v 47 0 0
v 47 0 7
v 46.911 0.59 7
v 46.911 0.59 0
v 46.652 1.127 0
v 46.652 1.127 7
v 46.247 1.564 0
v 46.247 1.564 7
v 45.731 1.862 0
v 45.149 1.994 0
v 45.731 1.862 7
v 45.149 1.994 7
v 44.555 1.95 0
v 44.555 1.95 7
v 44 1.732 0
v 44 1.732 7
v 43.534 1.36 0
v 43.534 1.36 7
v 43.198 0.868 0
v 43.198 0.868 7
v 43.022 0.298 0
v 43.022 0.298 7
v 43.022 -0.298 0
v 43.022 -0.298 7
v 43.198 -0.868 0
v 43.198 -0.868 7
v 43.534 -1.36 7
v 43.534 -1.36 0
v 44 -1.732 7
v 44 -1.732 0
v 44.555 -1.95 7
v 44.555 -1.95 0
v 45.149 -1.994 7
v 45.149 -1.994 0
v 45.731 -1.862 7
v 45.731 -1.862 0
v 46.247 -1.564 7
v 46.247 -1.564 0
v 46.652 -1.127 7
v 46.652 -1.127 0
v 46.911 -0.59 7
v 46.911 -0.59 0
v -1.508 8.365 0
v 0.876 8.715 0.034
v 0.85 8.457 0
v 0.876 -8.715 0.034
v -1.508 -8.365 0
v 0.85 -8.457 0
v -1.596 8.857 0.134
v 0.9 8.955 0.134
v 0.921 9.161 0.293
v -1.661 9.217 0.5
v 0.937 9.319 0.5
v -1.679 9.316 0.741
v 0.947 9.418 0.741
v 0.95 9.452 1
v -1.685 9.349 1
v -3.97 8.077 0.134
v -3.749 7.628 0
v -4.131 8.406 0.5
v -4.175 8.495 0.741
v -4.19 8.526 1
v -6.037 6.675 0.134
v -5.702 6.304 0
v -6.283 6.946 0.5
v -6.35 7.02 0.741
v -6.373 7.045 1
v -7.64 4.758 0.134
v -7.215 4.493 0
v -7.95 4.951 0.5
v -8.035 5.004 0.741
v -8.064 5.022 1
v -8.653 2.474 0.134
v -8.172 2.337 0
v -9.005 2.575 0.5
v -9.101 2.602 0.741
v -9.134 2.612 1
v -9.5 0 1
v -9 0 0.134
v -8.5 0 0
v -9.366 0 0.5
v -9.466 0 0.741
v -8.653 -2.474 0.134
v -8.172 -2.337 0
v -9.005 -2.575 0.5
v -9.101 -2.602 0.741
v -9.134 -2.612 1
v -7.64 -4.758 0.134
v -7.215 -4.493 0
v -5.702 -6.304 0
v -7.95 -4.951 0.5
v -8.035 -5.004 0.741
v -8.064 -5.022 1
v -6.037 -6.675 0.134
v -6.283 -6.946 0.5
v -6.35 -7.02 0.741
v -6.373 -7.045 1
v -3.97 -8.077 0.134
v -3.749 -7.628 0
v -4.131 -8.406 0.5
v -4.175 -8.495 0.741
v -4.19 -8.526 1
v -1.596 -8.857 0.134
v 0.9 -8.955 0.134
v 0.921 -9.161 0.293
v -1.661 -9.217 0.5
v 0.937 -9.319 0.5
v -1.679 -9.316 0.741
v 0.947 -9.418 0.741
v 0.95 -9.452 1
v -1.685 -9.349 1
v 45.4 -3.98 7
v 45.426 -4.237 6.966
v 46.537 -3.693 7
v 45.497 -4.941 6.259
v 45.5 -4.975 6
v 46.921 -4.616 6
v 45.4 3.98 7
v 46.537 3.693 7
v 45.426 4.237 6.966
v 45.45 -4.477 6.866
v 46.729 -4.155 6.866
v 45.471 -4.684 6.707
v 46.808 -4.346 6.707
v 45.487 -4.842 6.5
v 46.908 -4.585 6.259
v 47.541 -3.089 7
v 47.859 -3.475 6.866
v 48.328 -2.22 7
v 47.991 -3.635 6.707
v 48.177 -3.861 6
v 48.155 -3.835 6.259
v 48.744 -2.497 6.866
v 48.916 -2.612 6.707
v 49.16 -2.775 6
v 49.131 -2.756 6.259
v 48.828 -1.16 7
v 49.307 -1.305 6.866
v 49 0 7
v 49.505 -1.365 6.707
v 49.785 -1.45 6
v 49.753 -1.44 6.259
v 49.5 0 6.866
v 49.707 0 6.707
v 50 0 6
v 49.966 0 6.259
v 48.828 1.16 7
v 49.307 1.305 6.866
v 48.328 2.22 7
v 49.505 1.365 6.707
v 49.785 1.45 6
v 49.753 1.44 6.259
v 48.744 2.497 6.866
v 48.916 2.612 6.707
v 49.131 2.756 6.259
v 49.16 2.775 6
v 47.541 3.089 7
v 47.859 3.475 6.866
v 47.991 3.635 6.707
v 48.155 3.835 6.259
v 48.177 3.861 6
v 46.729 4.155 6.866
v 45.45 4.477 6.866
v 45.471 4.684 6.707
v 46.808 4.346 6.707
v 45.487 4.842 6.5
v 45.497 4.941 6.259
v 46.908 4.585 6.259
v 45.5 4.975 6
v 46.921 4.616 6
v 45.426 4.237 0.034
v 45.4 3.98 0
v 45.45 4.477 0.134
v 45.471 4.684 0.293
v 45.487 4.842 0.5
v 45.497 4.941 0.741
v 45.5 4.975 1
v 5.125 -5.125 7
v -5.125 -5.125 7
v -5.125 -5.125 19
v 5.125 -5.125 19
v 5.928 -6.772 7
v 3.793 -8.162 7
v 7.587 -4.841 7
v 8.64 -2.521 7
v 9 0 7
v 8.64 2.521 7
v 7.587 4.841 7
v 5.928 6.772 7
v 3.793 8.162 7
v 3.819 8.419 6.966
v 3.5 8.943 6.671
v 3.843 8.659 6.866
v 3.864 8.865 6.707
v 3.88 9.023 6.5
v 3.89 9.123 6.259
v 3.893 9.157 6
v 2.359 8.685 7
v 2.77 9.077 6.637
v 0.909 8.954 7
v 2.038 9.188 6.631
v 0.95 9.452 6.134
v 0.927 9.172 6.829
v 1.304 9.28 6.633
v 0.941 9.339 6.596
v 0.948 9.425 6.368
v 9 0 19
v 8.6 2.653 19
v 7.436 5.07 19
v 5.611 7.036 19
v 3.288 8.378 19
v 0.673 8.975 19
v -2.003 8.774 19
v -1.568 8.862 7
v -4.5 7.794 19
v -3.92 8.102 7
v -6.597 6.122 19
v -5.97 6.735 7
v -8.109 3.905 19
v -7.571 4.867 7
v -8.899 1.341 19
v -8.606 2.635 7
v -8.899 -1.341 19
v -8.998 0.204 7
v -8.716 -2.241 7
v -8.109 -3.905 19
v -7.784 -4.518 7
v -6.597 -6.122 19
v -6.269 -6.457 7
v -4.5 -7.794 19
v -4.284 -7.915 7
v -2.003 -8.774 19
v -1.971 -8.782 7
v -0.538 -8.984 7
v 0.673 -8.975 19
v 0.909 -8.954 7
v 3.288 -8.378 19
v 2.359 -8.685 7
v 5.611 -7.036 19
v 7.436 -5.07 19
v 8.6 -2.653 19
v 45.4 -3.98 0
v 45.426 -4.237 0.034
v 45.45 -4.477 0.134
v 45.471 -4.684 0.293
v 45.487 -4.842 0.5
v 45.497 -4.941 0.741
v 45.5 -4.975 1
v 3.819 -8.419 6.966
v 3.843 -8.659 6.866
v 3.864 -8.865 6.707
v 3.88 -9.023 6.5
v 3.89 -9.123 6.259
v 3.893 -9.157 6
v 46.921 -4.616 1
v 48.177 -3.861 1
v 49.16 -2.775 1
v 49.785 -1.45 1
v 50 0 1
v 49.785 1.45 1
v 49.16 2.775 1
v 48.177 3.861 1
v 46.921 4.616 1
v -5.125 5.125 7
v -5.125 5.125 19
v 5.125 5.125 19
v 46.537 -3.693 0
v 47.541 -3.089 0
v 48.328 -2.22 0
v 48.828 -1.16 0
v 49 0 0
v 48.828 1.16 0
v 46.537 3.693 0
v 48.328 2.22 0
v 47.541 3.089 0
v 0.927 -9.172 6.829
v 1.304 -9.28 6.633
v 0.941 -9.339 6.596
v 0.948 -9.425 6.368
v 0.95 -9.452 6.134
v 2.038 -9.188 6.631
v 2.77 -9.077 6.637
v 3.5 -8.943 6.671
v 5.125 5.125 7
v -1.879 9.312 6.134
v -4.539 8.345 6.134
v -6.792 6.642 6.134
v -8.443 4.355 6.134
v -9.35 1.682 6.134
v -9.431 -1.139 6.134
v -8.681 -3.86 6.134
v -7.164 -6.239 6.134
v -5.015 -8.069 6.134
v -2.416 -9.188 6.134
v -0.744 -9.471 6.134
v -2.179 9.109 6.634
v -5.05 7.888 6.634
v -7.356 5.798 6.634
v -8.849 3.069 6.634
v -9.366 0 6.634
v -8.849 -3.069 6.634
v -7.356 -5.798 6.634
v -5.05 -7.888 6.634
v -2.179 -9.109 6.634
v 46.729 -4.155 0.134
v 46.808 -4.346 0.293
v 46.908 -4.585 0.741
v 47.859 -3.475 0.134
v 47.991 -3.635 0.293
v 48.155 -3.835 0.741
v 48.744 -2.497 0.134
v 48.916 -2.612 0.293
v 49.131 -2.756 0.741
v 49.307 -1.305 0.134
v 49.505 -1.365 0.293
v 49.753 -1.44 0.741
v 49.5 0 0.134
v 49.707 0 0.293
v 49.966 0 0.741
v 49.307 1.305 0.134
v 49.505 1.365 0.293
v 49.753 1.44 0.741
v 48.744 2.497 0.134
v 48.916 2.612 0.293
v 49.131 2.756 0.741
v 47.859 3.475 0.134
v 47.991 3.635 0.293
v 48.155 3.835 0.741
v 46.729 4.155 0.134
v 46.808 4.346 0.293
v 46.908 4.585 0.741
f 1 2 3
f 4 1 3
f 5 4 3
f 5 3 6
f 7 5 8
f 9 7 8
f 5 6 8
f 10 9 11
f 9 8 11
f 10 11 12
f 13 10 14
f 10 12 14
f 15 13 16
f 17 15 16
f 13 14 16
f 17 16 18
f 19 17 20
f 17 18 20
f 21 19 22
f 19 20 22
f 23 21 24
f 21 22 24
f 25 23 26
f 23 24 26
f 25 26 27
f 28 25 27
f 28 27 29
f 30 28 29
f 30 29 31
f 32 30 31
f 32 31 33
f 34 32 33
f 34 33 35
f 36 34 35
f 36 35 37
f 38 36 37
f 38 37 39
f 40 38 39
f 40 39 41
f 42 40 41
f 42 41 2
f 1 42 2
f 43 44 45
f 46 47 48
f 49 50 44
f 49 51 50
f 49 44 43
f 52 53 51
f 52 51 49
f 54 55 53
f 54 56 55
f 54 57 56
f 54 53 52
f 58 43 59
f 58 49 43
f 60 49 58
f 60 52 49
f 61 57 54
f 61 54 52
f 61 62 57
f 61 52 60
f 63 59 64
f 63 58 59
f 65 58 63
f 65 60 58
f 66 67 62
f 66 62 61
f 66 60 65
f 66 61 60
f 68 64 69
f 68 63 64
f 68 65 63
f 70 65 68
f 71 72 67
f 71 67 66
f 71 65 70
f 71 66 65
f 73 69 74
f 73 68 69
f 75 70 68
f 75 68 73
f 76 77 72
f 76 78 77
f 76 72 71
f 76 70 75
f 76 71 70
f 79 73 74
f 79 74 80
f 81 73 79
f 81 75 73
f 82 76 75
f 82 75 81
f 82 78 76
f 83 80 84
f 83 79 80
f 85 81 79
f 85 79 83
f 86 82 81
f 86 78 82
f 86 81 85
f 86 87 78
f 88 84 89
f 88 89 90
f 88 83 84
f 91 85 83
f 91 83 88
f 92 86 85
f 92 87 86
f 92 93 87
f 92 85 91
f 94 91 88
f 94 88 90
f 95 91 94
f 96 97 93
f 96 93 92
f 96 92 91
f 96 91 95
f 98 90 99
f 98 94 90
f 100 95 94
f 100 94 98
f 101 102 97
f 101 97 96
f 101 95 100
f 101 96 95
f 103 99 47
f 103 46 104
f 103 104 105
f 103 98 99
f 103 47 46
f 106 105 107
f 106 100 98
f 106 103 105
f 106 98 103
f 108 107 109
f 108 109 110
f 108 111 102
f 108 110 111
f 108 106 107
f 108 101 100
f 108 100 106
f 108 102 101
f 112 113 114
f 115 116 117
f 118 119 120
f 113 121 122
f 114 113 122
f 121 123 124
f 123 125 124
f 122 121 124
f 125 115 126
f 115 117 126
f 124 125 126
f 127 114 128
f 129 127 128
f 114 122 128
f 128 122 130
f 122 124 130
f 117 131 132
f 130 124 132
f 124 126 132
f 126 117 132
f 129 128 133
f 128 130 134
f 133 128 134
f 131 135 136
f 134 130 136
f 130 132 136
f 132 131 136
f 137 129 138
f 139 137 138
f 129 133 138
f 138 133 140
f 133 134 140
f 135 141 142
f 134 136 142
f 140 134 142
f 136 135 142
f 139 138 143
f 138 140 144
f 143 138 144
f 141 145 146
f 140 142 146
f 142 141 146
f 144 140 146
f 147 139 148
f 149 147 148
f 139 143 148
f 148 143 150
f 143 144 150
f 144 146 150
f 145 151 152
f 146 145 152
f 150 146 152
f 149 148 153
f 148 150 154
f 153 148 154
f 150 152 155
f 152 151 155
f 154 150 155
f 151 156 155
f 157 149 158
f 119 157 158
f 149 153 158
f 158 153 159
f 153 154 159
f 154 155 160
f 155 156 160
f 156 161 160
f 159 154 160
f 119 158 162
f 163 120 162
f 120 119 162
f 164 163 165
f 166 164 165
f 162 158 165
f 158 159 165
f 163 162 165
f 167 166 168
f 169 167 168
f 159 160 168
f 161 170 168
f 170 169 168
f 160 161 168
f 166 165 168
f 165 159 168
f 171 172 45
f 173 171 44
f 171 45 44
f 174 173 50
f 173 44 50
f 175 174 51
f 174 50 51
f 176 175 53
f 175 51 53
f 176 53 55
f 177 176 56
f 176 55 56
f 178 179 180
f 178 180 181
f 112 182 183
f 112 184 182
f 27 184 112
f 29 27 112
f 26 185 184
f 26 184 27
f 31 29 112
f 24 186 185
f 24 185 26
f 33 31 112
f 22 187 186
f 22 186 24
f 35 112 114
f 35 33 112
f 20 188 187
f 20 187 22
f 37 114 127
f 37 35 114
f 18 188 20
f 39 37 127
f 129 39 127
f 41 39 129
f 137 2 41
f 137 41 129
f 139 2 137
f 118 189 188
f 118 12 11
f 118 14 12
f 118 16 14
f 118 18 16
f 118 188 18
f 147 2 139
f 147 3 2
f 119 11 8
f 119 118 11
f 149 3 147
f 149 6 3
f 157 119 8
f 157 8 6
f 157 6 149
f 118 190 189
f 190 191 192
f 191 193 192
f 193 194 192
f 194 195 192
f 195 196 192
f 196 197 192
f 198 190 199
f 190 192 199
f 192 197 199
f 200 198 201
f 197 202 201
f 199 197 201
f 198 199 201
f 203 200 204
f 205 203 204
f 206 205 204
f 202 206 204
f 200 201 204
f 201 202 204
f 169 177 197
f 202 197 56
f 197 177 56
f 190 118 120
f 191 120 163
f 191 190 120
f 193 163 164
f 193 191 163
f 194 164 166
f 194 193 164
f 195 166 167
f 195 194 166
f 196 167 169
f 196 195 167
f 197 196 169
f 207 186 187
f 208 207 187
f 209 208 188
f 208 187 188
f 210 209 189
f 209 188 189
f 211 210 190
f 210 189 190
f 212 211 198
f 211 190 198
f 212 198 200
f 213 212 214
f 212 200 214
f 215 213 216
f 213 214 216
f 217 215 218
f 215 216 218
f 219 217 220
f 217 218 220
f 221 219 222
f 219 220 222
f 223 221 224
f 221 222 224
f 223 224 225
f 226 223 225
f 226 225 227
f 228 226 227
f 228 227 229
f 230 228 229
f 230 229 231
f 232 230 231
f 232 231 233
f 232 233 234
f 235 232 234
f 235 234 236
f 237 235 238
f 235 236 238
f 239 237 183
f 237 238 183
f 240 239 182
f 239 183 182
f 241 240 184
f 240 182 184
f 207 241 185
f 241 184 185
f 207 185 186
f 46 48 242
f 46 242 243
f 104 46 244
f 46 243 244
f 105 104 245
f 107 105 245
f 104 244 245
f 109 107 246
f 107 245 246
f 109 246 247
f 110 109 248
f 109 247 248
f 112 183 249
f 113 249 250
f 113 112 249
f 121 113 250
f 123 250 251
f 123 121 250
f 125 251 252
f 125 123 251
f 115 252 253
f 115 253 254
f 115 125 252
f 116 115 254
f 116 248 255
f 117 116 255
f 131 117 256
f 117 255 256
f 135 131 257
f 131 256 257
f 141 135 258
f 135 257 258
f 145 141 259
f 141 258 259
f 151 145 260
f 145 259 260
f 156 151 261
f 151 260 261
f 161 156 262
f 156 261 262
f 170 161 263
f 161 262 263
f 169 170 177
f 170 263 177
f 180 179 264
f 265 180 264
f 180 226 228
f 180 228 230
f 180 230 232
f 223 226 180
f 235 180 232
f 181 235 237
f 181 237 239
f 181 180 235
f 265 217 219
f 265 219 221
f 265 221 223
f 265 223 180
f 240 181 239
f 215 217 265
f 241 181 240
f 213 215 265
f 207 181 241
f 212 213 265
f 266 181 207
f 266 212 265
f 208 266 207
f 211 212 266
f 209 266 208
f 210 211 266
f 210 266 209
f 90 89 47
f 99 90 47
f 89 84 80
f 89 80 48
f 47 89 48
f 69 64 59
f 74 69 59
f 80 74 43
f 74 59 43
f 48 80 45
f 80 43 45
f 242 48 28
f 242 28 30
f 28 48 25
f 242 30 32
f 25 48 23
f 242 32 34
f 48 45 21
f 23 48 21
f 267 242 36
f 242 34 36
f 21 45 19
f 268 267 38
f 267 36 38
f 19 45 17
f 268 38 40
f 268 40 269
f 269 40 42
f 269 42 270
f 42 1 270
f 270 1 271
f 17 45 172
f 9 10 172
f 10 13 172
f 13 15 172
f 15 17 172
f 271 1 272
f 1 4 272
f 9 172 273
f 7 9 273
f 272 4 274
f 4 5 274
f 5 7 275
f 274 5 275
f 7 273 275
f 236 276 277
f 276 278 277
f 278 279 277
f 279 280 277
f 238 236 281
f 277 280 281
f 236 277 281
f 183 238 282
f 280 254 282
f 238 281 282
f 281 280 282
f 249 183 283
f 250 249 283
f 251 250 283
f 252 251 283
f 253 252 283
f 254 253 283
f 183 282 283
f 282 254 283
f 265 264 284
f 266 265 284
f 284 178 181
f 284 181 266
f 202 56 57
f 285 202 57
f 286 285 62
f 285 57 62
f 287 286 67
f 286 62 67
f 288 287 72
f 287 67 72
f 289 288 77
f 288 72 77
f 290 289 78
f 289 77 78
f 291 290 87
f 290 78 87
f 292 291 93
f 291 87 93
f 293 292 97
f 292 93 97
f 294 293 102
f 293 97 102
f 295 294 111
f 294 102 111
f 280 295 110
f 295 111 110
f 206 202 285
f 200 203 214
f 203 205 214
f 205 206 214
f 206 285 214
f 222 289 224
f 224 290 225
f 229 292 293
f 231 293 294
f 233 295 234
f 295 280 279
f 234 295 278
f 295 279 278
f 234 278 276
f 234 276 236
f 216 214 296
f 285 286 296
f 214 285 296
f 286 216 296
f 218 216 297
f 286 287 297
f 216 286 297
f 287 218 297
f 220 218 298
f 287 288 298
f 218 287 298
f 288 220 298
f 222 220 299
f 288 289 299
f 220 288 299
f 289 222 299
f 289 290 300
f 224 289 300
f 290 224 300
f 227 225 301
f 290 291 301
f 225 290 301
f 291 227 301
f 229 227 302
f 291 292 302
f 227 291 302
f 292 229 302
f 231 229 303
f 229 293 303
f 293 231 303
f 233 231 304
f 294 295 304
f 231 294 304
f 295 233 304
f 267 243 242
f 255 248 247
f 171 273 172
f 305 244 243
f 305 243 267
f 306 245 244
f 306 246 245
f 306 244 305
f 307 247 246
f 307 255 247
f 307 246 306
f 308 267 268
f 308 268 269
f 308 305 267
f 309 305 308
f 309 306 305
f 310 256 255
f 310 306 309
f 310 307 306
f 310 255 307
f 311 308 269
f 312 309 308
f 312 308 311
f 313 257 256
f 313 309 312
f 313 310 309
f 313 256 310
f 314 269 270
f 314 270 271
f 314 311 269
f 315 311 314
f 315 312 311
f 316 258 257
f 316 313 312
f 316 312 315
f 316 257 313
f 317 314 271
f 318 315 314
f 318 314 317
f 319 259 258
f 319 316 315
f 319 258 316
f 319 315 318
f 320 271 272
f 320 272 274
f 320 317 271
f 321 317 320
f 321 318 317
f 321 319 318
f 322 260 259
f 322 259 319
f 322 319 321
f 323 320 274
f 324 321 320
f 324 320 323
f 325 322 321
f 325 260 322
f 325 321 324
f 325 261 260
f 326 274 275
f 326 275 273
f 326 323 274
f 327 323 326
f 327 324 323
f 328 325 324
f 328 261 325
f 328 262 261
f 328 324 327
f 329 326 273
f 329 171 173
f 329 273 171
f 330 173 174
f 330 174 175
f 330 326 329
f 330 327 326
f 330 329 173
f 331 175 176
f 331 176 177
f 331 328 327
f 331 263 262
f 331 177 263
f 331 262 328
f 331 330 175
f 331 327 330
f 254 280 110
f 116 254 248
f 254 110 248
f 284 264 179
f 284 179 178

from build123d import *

# Parameters (mm, degrees)
F1_DEPTH = 7
F2_R     = 2
F3_DEPTH = 25
F2_R_2   = 9
F2_W     = 10.25
F2_H     = 10.25
F4_DEPTH = 12
F5_R     = 1


with BuildPart() as f1:
    # F0 (on Top) → F1 (new body)
    with BuildSketch(Plane.XY):
        with BuildLine():
            Line((45.5, 4.974937), (0.95, 9.452381))
            ThreePointArc((0.95, 9.452381), (-9.5, 0), (0.95, -9.452381))
            Line((0.95, -9.452381), (45.5, -4.974937))
            ThreePointArc((45.5, -4.974937), (50, 0), (45.5, 4.974937))
        make_face()
    extrude(amount=F1_DEPTH)

    # F2 (on face) → F3 (cut)
    with BuildSketch(Plane.XY.offset(7)):
        with Locations((45, 0)):
            Circle(F2_R)
    extrude(amount=-F3_DEPTH, mode=Mode.SUBTRACT)

    # F2 (on face) → F4 (join)
    with BuildSketch(Plane.XY.offset(7)):
        Circle(F2_R_2)
        Rectangle(F2_W, F2_H, mode=Mode.SUBTRACT)
    extrude(amount=F4_DEPTH)

    # F5
    f5_edges = [f1.edges().sort_by_distance(p)[0] for p in [
        (23.225, -7.213659, 0),
        (23.225, -7.213659, 7),
    ]]
    fillet(f5_edges, radius=F5_R)


solid = f1.part
